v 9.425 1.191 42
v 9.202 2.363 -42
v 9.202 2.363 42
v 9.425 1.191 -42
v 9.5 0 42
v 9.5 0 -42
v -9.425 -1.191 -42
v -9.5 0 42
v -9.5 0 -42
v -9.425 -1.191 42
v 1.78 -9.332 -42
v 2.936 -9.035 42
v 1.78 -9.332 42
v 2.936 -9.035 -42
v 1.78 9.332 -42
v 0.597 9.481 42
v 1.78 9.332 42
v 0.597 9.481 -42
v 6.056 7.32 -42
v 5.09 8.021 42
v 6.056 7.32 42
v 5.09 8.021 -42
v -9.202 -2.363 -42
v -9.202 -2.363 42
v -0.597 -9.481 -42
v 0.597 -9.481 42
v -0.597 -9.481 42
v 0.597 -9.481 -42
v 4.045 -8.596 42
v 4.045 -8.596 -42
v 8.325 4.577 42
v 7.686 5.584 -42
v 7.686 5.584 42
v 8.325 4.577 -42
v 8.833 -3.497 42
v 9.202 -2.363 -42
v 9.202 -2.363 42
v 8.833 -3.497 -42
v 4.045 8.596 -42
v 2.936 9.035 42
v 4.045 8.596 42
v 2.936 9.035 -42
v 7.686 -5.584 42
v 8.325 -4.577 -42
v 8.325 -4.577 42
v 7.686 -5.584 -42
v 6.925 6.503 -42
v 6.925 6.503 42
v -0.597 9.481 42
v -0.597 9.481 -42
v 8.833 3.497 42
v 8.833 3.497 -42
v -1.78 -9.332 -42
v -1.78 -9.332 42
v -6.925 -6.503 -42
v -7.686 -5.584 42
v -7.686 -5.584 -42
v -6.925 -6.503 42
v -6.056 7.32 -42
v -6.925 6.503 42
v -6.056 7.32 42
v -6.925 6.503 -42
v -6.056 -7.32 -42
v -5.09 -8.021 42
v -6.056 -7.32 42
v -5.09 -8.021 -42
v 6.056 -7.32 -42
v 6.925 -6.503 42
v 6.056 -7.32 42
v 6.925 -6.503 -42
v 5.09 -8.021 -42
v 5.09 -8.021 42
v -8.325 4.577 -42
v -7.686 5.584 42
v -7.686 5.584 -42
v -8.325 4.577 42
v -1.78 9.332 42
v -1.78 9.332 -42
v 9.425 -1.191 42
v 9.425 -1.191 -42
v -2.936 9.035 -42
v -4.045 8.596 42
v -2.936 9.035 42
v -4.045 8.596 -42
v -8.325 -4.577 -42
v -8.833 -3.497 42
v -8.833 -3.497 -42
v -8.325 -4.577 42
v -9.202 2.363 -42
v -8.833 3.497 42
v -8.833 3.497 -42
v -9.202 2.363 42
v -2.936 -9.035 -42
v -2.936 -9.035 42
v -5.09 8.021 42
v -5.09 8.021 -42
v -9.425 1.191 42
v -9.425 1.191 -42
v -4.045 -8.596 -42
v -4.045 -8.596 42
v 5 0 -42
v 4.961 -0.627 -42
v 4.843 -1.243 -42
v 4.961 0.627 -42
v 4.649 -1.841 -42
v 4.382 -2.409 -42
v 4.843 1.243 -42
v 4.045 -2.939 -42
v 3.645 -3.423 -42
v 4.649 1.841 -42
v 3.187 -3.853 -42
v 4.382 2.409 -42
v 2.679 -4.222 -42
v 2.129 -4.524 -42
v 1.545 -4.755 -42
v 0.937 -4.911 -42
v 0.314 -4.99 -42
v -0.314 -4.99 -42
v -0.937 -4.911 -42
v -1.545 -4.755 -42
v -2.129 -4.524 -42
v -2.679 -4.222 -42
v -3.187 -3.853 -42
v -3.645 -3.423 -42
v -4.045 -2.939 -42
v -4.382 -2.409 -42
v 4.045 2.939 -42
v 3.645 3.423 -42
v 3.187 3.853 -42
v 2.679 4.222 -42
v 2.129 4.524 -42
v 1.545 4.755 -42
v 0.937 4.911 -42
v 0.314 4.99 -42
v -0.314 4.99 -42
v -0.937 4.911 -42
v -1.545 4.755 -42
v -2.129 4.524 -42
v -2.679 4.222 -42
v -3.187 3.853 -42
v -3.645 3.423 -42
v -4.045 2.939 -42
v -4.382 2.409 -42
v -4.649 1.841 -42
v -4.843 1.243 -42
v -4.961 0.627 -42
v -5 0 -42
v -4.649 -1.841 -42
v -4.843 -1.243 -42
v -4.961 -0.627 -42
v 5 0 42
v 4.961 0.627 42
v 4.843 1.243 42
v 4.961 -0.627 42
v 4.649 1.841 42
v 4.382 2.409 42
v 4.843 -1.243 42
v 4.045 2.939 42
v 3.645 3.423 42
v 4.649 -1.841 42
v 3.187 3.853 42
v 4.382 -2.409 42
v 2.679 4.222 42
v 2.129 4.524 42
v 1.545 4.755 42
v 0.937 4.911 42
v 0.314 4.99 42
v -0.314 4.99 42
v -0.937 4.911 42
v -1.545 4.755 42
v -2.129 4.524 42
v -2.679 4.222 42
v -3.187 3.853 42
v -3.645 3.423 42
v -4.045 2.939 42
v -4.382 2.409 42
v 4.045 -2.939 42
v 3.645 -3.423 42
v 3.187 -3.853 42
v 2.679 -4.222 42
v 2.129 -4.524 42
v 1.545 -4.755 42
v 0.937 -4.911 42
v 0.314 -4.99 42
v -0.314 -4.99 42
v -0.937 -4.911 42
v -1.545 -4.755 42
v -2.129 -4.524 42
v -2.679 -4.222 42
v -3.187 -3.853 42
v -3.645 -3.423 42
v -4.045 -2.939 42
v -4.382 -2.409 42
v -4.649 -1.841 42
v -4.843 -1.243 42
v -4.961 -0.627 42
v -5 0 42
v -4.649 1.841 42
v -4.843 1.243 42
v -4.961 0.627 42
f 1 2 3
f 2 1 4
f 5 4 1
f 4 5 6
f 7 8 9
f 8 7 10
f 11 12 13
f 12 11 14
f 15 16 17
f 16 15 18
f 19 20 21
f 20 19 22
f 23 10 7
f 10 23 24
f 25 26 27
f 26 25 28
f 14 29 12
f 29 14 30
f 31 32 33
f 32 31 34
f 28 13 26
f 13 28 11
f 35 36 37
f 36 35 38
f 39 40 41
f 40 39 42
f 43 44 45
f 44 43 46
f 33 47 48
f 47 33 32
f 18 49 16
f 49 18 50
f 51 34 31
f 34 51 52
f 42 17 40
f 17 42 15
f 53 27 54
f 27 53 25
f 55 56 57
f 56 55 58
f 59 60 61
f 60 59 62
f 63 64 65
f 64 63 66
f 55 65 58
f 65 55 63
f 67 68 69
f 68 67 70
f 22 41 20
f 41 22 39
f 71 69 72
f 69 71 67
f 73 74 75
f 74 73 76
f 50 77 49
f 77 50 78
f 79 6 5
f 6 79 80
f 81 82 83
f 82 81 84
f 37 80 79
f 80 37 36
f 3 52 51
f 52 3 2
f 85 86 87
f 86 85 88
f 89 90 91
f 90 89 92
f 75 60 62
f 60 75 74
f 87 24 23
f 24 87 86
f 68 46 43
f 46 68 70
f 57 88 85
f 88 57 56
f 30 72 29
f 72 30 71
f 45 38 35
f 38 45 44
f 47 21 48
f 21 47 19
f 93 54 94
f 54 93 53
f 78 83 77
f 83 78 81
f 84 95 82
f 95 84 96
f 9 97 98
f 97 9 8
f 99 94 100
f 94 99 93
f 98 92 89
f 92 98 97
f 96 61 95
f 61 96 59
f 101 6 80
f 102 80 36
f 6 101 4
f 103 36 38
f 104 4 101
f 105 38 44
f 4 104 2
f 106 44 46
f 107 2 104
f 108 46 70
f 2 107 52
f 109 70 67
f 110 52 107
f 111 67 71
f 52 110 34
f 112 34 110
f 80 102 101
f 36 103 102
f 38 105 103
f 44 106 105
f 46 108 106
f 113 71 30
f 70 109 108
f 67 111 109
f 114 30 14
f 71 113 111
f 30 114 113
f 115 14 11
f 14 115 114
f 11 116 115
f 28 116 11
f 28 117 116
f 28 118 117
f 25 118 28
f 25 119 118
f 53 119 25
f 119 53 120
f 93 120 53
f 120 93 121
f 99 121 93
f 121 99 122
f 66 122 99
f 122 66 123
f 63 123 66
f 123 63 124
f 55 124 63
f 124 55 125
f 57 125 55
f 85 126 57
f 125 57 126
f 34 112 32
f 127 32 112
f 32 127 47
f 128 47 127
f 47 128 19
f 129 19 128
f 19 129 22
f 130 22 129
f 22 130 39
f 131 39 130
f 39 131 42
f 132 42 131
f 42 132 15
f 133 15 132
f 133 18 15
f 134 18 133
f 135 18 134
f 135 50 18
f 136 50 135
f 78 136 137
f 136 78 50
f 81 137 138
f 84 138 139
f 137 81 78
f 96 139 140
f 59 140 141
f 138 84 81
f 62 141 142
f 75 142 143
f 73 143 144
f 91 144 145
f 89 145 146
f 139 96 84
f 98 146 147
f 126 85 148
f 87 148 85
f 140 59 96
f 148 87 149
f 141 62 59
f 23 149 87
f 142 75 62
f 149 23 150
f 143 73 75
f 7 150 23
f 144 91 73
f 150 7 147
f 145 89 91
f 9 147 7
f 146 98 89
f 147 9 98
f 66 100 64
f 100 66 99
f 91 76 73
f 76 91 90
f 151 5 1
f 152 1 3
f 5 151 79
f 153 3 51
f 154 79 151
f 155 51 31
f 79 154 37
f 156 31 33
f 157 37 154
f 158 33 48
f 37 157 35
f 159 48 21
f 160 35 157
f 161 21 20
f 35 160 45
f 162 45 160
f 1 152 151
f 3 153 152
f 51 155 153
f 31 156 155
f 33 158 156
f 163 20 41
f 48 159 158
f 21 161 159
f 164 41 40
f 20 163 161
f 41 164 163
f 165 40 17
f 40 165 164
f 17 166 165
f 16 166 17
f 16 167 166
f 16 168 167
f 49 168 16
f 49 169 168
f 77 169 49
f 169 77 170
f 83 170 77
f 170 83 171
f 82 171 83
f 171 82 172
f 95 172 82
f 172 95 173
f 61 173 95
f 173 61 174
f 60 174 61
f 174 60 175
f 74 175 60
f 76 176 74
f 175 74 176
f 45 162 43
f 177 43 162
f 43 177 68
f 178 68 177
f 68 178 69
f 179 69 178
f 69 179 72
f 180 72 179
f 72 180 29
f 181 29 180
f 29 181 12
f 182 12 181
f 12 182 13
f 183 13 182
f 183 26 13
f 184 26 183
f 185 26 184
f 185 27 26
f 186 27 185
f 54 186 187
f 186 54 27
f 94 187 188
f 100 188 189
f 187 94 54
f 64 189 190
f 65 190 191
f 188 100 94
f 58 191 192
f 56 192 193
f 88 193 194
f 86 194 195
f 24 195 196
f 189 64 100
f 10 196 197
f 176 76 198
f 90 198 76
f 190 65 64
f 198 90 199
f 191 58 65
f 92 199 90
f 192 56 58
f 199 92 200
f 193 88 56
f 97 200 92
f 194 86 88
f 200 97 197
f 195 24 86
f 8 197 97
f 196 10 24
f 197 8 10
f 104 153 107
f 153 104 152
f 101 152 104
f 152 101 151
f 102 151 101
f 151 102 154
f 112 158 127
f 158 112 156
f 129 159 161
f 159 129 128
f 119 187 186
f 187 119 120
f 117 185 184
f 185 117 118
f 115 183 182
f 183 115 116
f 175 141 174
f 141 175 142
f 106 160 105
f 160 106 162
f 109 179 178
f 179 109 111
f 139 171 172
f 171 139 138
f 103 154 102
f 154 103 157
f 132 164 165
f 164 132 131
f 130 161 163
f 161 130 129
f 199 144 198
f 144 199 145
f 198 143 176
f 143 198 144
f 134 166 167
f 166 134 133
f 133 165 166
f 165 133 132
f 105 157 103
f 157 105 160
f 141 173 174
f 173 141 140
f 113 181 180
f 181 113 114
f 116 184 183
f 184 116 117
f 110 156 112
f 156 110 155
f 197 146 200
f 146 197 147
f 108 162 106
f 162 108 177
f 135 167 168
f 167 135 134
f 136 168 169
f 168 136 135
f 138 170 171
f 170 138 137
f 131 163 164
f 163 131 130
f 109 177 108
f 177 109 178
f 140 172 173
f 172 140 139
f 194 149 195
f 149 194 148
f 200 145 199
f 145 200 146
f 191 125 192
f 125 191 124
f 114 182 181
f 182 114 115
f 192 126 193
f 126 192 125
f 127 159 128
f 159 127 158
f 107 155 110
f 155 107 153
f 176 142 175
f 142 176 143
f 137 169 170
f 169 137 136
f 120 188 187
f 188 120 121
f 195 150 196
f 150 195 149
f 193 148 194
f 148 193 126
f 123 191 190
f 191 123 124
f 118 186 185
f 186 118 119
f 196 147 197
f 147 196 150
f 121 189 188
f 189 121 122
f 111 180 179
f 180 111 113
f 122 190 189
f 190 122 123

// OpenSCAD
$fn = 50;


difference() {
	union() {
		translate(v = [0, 0, -42.0000000000]) {
			cylinder(h = 84, r = 9.5000000000);
		}
	}
	union() {
		translate(v = [0, 0, -100.0000000000]) {
			cylinder(h = 200, r = 5.0000000000);
		}
	}
}
